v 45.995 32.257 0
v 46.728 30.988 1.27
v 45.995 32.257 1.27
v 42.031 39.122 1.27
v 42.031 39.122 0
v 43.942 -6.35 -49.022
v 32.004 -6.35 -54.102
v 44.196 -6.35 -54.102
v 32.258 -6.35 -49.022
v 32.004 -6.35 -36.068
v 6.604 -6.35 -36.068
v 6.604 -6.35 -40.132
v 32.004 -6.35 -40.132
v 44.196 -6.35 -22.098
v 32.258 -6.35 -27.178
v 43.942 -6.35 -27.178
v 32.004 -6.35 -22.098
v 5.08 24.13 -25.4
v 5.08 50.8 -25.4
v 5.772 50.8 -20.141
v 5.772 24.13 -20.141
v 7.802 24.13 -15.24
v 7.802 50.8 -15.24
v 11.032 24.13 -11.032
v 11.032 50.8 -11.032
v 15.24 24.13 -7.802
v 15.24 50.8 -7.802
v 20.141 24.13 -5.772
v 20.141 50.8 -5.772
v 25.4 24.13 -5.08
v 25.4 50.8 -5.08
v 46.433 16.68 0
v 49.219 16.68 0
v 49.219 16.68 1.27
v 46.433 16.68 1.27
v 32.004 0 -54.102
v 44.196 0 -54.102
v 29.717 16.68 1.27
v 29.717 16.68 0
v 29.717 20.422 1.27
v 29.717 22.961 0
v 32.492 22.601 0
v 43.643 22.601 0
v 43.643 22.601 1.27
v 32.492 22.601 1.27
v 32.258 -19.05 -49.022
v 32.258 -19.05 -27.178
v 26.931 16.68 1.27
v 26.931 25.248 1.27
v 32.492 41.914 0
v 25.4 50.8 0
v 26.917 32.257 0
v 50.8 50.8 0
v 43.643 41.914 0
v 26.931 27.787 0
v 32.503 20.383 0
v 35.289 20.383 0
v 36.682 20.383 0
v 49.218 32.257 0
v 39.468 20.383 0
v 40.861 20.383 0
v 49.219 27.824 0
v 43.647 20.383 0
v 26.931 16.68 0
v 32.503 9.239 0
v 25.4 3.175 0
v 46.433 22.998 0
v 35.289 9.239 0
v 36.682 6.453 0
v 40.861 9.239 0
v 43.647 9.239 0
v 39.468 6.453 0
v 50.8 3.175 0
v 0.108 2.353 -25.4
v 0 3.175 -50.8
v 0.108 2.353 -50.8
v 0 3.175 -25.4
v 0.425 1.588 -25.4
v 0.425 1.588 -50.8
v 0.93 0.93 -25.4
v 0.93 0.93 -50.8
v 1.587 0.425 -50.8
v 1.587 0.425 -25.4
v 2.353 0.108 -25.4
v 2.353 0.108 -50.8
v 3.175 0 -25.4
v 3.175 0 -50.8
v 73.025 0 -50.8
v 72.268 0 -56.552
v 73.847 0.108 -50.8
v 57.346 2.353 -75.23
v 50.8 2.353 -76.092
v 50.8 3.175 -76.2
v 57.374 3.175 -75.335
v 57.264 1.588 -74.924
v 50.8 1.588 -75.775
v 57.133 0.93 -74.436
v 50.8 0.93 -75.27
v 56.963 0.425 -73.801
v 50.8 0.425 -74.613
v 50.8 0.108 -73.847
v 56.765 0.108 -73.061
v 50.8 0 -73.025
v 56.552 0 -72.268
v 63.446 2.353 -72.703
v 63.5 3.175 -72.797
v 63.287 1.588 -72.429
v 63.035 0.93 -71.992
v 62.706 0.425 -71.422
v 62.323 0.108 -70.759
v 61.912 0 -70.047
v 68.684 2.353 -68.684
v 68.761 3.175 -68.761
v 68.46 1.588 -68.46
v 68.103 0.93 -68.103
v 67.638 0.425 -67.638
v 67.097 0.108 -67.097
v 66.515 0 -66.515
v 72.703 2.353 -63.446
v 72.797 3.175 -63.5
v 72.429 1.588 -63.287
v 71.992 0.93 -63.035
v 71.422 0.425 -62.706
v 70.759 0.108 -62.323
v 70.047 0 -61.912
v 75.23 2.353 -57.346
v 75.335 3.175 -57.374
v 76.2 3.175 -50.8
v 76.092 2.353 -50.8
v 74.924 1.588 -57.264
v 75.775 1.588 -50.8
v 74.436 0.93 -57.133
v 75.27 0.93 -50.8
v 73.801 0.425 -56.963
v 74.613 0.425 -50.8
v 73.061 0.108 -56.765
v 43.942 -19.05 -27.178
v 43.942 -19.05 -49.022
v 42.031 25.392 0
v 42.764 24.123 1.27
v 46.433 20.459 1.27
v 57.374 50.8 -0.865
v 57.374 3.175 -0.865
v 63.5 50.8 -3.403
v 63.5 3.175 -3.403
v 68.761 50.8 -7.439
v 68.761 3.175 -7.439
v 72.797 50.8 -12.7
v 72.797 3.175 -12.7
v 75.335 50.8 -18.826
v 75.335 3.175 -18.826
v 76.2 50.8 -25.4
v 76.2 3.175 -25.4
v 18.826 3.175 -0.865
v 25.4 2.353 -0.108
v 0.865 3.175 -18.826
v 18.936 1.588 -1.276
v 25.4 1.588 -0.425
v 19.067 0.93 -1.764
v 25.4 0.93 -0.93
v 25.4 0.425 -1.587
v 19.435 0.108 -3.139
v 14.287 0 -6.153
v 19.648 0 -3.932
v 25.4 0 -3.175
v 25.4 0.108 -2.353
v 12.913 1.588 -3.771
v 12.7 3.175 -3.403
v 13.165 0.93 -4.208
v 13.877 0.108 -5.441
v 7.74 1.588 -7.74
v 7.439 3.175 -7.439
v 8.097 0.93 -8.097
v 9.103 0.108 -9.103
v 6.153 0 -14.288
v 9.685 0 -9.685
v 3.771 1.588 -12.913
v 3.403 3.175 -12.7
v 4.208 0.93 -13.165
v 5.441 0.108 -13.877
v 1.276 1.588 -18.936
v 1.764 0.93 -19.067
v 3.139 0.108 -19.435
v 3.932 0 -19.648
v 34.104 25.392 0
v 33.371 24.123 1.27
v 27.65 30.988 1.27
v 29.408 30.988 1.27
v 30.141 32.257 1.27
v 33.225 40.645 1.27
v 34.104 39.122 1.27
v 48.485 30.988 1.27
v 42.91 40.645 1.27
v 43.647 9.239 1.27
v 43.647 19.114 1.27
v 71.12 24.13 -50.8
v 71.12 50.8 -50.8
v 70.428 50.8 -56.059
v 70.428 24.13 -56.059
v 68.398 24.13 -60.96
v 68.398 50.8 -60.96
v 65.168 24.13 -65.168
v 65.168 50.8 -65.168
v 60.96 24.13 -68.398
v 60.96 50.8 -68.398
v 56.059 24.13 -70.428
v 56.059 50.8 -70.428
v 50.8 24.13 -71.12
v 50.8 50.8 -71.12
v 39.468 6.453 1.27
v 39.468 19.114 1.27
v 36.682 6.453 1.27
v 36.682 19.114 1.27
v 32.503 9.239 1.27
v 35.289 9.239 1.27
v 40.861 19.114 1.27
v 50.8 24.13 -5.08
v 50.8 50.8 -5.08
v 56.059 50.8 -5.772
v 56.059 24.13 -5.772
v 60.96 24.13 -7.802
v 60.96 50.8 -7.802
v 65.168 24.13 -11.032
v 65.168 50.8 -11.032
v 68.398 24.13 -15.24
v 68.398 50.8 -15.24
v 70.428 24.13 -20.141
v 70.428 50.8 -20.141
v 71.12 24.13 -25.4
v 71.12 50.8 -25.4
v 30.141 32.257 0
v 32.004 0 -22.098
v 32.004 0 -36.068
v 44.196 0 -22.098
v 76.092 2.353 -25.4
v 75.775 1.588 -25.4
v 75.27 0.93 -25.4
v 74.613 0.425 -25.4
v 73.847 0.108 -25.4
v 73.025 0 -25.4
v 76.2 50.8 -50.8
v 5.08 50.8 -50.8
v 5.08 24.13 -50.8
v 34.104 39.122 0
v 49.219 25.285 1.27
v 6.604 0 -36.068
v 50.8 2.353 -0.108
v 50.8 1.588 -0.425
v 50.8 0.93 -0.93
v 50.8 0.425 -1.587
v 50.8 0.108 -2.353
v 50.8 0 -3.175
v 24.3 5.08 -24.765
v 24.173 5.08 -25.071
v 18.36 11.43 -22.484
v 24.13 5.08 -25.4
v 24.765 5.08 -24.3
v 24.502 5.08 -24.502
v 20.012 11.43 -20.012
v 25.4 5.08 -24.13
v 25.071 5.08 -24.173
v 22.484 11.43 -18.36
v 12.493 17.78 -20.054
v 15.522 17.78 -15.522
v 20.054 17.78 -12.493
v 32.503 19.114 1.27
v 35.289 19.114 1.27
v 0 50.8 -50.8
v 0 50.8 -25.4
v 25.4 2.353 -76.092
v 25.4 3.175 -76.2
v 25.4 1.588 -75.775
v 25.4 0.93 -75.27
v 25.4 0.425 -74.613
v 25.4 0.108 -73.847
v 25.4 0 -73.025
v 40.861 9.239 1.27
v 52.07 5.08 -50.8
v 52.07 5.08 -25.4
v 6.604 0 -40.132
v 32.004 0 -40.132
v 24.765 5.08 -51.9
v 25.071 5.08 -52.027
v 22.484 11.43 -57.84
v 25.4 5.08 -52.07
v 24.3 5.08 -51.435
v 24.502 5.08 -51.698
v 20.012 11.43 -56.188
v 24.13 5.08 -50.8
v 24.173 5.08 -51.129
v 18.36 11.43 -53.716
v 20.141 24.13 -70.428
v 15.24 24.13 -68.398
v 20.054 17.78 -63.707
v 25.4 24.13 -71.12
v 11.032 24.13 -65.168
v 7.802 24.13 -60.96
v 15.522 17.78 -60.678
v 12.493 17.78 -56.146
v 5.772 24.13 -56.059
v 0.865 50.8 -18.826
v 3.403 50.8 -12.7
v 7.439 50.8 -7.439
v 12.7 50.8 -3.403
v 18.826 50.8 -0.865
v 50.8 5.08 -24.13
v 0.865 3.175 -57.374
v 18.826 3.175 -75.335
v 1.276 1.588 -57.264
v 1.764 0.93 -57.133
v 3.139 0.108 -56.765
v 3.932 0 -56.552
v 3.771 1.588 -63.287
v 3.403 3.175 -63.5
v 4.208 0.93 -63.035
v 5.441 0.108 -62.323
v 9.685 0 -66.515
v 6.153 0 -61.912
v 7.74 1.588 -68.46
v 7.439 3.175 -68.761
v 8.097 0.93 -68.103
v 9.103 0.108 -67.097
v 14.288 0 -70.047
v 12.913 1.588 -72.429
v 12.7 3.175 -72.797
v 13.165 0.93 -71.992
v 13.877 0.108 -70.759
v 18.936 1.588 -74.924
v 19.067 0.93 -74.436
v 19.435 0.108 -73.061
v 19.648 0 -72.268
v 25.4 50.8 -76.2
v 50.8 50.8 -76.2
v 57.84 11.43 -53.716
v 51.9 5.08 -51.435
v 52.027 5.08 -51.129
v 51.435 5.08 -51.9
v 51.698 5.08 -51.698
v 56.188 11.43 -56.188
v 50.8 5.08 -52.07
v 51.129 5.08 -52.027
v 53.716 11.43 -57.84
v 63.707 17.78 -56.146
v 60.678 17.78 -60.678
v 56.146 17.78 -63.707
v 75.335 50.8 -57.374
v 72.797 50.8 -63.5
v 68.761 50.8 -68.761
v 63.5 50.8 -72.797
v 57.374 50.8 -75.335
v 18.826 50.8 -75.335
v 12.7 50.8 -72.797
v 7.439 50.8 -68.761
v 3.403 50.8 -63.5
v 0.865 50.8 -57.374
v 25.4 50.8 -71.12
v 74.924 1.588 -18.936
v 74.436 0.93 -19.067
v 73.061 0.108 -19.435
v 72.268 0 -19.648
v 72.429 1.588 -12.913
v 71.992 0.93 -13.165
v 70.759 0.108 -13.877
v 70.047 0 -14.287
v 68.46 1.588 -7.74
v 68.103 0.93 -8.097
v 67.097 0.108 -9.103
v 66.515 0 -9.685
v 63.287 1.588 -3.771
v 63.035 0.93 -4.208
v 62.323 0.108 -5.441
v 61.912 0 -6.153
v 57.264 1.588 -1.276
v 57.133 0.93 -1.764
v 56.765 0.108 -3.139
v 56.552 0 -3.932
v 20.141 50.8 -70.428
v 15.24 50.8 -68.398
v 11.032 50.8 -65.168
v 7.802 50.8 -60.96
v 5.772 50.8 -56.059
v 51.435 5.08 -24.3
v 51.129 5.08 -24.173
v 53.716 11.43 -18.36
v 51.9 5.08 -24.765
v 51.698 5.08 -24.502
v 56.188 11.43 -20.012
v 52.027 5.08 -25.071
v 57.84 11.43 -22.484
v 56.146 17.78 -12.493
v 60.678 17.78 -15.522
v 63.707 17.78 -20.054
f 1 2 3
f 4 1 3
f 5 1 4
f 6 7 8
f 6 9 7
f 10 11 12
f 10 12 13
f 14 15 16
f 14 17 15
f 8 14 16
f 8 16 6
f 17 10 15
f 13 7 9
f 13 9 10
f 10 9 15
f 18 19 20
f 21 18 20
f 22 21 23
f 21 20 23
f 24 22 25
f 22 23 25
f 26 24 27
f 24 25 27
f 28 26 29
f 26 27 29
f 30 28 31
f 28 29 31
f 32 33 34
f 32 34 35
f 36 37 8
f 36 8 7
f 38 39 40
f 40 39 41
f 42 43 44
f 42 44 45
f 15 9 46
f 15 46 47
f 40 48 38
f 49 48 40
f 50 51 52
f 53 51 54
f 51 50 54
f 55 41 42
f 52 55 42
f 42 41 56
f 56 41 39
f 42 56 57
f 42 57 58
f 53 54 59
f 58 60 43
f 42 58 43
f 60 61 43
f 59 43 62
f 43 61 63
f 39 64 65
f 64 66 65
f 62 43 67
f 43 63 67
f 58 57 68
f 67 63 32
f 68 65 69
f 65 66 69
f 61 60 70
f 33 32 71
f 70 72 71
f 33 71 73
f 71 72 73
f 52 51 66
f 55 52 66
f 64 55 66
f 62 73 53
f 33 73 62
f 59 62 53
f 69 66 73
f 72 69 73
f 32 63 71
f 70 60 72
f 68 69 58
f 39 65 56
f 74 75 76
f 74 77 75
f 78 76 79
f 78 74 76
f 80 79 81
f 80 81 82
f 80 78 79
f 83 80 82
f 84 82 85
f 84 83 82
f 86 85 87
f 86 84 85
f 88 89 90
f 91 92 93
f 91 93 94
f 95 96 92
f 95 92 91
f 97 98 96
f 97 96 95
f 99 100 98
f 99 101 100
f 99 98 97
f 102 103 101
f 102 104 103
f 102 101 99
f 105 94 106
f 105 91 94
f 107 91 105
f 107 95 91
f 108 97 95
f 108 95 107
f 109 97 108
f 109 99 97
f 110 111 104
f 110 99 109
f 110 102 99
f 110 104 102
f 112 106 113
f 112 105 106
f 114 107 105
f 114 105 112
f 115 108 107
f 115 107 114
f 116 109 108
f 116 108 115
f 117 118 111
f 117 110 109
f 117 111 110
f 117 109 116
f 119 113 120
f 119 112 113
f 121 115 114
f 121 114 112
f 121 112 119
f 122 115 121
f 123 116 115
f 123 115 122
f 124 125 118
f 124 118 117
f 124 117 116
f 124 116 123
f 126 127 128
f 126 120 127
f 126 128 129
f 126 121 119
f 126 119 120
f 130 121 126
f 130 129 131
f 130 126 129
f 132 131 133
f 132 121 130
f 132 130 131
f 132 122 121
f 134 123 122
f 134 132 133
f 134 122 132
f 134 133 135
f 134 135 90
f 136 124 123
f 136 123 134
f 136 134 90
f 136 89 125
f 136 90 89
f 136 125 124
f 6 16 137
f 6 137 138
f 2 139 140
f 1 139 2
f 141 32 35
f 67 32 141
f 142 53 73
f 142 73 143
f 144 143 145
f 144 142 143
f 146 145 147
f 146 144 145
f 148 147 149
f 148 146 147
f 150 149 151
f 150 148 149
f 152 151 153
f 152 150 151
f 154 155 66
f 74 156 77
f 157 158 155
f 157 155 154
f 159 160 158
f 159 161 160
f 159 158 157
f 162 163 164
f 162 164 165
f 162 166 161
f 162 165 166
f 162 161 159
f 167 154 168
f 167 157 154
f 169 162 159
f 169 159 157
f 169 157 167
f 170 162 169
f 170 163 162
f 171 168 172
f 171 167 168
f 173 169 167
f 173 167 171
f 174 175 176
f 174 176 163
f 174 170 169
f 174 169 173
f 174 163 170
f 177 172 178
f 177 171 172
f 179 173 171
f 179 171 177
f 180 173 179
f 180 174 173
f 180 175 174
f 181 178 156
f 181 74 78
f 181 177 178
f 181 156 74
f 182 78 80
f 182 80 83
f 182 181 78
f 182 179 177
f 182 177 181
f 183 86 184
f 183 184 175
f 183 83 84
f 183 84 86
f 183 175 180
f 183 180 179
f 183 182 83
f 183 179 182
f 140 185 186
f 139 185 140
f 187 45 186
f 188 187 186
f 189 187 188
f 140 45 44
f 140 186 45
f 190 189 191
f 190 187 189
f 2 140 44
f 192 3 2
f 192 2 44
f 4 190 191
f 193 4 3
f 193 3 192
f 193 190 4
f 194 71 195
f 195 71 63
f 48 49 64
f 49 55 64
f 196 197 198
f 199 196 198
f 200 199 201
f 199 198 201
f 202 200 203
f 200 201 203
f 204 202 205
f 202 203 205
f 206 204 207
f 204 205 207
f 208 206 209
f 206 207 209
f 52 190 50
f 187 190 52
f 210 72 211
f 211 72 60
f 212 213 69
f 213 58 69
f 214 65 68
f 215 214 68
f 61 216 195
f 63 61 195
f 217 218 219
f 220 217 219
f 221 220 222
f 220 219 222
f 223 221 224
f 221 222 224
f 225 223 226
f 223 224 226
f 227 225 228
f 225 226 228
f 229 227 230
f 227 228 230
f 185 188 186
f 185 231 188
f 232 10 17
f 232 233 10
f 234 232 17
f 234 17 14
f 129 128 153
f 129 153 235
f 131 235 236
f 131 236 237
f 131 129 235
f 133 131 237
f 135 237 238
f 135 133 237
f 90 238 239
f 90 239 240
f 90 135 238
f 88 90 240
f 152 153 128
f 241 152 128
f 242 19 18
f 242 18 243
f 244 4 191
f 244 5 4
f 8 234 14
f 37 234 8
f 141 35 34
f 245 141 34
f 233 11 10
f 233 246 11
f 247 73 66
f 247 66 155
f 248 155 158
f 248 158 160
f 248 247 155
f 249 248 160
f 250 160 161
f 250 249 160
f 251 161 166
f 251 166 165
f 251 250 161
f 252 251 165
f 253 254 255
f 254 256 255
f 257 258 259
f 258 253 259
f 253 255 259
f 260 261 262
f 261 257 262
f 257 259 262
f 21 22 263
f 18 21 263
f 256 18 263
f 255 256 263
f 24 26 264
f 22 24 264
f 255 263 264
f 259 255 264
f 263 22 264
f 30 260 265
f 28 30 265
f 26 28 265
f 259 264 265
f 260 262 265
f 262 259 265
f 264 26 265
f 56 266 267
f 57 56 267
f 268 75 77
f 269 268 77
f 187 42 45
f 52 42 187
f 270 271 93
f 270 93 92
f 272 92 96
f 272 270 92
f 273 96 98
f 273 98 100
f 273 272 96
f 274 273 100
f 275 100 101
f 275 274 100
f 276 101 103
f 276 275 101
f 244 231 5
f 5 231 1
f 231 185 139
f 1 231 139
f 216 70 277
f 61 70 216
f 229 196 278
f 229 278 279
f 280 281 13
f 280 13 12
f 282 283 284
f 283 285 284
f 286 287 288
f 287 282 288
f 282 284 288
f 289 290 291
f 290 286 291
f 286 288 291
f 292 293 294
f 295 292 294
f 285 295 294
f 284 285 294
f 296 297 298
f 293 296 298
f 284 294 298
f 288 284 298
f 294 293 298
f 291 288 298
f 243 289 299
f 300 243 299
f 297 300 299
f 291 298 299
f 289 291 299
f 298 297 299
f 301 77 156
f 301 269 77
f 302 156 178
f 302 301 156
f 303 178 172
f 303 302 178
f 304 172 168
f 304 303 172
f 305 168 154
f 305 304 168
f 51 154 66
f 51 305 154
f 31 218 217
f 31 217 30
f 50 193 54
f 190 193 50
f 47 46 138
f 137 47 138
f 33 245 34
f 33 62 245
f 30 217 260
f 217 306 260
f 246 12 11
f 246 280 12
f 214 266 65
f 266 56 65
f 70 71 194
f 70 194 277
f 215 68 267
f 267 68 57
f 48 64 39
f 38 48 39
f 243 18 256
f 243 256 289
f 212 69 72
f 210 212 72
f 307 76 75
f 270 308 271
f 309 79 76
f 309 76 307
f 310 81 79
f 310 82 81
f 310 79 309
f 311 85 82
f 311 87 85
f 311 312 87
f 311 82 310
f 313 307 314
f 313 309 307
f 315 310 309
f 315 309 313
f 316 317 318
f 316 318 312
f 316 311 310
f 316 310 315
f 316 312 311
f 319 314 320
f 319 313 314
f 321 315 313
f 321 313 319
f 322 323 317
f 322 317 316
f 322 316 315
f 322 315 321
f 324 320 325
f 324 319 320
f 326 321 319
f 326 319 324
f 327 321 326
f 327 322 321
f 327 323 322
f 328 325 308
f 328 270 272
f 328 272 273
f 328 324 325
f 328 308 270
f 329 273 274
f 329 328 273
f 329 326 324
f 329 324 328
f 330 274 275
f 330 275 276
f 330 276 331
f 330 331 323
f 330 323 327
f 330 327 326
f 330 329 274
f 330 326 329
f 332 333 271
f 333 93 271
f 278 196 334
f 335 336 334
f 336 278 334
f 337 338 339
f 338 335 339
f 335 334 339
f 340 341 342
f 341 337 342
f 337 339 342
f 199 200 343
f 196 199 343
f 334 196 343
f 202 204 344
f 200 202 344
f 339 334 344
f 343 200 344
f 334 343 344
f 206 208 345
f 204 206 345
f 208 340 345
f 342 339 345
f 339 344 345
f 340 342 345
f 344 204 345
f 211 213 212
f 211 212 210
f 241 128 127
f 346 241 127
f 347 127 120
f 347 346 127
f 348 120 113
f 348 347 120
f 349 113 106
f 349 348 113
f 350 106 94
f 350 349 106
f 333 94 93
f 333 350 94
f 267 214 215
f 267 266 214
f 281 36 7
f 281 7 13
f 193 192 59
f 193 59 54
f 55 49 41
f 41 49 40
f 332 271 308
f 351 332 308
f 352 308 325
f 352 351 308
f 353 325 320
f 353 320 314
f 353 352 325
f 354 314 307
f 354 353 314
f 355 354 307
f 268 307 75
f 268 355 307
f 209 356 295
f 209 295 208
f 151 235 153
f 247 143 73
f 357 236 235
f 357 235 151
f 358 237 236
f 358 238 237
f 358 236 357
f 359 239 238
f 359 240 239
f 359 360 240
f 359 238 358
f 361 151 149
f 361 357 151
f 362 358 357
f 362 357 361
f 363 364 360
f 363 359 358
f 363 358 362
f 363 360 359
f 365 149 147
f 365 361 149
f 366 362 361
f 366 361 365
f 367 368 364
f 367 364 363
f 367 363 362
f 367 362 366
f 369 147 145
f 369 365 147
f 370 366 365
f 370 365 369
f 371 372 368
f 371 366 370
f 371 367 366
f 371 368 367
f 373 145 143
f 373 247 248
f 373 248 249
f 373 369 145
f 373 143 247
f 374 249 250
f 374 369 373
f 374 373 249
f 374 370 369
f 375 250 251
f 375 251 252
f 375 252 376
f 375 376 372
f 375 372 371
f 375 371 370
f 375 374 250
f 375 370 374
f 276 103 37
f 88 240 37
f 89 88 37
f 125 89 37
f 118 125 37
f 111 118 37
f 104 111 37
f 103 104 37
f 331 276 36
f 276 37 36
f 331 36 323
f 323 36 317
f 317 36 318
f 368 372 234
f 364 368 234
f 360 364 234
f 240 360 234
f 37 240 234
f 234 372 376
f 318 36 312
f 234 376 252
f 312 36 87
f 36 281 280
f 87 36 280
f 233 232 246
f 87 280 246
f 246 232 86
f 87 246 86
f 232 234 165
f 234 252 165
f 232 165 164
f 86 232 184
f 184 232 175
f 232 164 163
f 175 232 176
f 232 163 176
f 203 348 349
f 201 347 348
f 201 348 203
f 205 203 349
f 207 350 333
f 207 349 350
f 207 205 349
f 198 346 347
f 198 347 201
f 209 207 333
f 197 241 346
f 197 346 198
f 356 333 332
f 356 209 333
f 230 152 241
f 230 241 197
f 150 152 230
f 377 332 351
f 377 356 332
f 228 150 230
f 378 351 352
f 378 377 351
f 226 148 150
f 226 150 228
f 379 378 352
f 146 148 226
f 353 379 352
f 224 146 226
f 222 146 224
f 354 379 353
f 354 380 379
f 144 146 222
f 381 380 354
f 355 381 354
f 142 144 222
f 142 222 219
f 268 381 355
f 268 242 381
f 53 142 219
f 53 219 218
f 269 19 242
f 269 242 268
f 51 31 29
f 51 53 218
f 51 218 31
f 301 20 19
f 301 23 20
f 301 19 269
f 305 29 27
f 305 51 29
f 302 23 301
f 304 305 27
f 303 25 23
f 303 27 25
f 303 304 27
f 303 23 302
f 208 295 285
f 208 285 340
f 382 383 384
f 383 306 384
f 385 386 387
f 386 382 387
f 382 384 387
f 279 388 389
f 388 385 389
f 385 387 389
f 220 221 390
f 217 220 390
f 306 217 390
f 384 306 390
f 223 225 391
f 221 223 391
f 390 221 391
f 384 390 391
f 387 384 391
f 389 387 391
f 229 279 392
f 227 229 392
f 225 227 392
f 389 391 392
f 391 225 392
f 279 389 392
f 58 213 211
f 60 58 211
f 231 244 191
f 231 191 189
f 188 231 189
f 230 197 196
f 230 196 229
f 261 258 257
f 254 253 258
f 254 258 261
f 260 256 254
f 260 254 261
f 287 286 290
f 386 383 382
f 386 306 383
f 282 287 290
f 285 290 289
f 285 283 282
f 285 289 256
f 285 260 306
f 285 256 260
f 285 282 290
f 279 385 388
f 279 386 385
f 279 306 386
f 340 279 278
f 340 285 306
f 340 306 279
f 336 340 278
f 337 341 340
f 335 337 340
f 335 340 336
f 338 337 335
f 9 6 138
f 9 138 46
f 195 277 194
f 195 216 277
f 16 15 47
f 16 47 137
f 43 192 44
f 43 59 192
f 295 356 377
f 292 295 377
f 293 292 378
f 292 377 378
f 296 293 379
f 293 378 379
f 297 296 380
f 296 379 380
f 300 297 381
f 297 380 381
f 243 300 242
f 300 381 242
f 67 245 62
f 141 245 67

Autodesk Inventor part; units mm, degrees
ref_plane "YZ Plane" through (0, 0, 0) normal (1, 0, 0) x (0, 1, 0)
ref_plane "XZ Plane" through (0, 0, 0) normal (0, 1, 0) x (-1, 0, 0)
ref_plane "XY Plane" through (0, 0, 0) normal (0, 0, 1) x (1, 0, 0)
sketch "Sketch1" plane through (0, 0, 0) normal (0, 1, 0) x (-1, 0, 0)
  line L0 (0, 0) -> (-76.2, 0)
  line L1 (-76.2, 0) -> (-76.2, -76.2)
  line L2 (-76.2, -76.2) -> (0, -76.2)
  line L3 (0, -76.2) -> (0, 0)
  dimension "d0" = 76.2
  dimension "d1" = 76.2
extrude "Extrusion1" add sketch "Sketch1" along normal blind 50.8
sketch "Sketch3" plane through (0, 0, 0) normal (0, -1, 0) x (1, 0, 0)
  line L0 (44.196, -54.102) -> (32.004, -54.102)
  line L1 (32.004, -54.102) -> (32.004, -22.098)
  line L2 (32.004, -22.098) -> (44.196, -22.098)
  line L3 (44.196, -22.098) -> (44.196, -54.102)
  line L4 (76.2, 0) -> (76.2, -76.2) projected
  line L5 (0, 0) -> (76.2, 0) projected
  line L6 (32.004, -40.132) -> (6.604, -40.132)
  line L7 (6.604, -40.132) -> (6.604, -36.068)
  line L8 (6.604, -36.068) -> (32.004, -36.068)
  line L9 (32.004, -36.068) -> (32.004, -40.132)
  point P0 (44.196, -38.1)
  point P1 (76.2, -38.1)
  point P2 (38.1, -22.098)
  point P3 (38.1, 0)
  point P4 (6.604, -38.1)
  point P5 (32.004, -38.1)
  dimension "d10" = 32.004
  dimension "d11" = 12.192
  dimension "d12" = 25.4
  dimension "d13" = 4.064
extrude "Extrusion3" add sketch "Sketch3" along normal blind 6.35
sketch "Sketch4" plane through (0, -6.35, 0) normal (0, -1, 0) x (1, 0, 0)
  line L0 (43.942, -49.022) -> (32.258, -49.022)
  line L1 (32.258, -49.022) -> (32.258, -27.178)
  line L2 (32.258, -27.178) -> (43.942, -27.178)
  line L3 (43.942, -27.178) -> (43.942, -49.022)
  line L4 (44.196, -54.102) -> (44.196, -22.098) projected
  line L5 (32.004, -54.102) -> (44.196, -54.102) projected
  point P0 (0, 0)
  point P1 (32.258, -38.1)
  point P2 (44.196, -38.1)
  point P3 (38.1, -49.022)
  point P4 (38.1, -54.102)
  dimension "d16" = 21.844
  dimension "d17" = 11.684
extrude "Extrusion4" add sketch "Sketch4" along normal blind 12.7
fillet "Fillet1" radius 25.4 4 edges at (0, 25.4, -76.2) (0, 25.4, 0) (76.2, 25.4, -76.2) (76.2, 25.4, 0)
sketch "Sketch5" plane through (0, 50.8, 0) normal (0, 1, 0) x (1, 0, 0)
  arc A0 (50.8, 0) -> (76.2, 25.4) centre (50.8, 25.4) ccw projected
  line L0 (76.2, 25.4) -> (76.2, 50.8) projected
  arc A1 (76.2, 50.8) -> (50.8, 76.2) centre (50.8, 50.8) ccw projected
  line L1 (50.8, 76.2) -> (25.4, 76.2) projected
  arc A2 (25.4, 76.2) -> (0, 50.8) centre (25.4, 50.8) ccw projected
  line L2 (0, 50.8) -> (0, 25.4) projected
  arc A3 (0, 25.4) -> (25.4, 0) centre (25.4, 25.4) ccw projected
  line L3 (25.4, 0) -> (50.8, 0) projected
  arc A4 (25.4, 71.12) -> (5.08, 50.8) centre (25.4, 50.8) ccw
  line L4 (25.4, 71.12) -> (50.8, 71.12)
  arc A5 (71.12, 50.8) -> (50.8, 71.12) centre (50.8, 50.8) ccw
  line L5 (71.12, 50.8) -> (71.12, 25.4)
  arc A6 (50.8, 5.08) -> (71.12, 25.4) centre (50.8, 25.4) ccw
  line L6 (50.8, 5.08) -> (25.4, 5.08)
  arc A7 (5.08, 25.4) -> (25.4, 5.08) centre (25.4, 25.4) ccw
  line L7 (5.08, 25.4) -> (5.08, 50.8)
  point P0 (0, 0)
  point P1 (38.1, 76.2)
  dimension "d21" = 5.08
extrude "Extrusion5" cut sketch "Sketch5" against normal blind 45.72 contours L4 A5 L5 A6 L6 A7 L7 A4
fillet "Fillet2" radius 3.175 8 edges at (0, 0, -38.1) (7.4395, 0, -7.4395) (38.1, 0, 0) (68.7605, 0, -7.4395) (76.2, 0, -38.1) (68.7605, 0, -68.7605) (38.1, 0, -76.2) (7.4395, 0, -68.7605)
chamfer "Chamfer1" distance 19.05 angle 45 8 edges at (38.1, 5.08, -5.08) (11.0316, 5.08, -11.0316) (5.08, 5.08, -38.1) (11.0316, 5.08, -65.1684) (38.1, 5.08, -71.12) (65.1684, 5.08, -65.1684) (71.12, 5.08, -38.1) (65.1684, 5.08, -11.0316)
sketch "Sketch6" plane through (0, 50.8, -50.8) normal (-1, 0, 0) x (0, 0, 1)
  line L0 (7.2288, -10.0054) -> (18.3794, -10.0054)
  line L1 (18.3794, -10.0054) -> (23.9547, -19.6621)
  line L2 (23.9547, -19.6621) -> (18.3794, -29.3188)
  line L3 (18.3794, -29.3188) -> (7.2288, -29.3188)
  line L4 (7.2288, -29.3188) -> (1.6535, -19.6621)
  line L5 (1.6535, -19.6621) -> (7.2288, -10.0054)
  line L6 (16.7677, -26.5271) -> (20.7312, -19.6621)
  line L7 (20.7312, -19.6621) -> (16.7677, -12.797)
  line L8 (16.7677, -12.797) -> (8.8406, -12.797)
  line L9 (8.8406, -12.797) -> (4.877, -19.6621)
  line L10 (4.877, -19.6621) -> (8.8406, -26.5271)
  line L11 (8.8406, -26.5271) -> (16.7677, -26.5271)
  line L12 (23.9558, -24.0955) -> (23.9558, -35.2397)
  line L13 (23.9558, -35.2397) -> (21.1698, -35.2397)
  line L14 (21.1698, -35.2397) -> (21.1698, -28.9211)
  line L15 (21.1698, -28.9211) -> (23.9558, -24.0955)
  line L16 (18.3837, -42.6806) -> (15.5977, -42.6806)
  line L17 (15.5977, -42.6806) -> (15.5977, -31.5364)
  line L18 (7.2396, -31.5364) -> (7.2396, -42.6806)
  line L19 (7.2396, -42.6806) -> (10.0256, -42.6806)
  line L20 (10.0256, -42.6806) -> (10.0256, -31.5364)
  line L21 (1.6675, -24.1328) -> (1.6675, -35.2397)
  line L22 (1.6675, -35.2397) -> (4.4535, -35.2397)
  line L23 (4.4535, -35.2397) -> (4.4535, -28.9583)
  line L24 (4.4535, -28.9583) -> (1.6675, -24.1328)
  line L25 (14.2047, -45.4666) -> (14.2047, -31.5364)
  line L26 (14.2047, -31.5364) -> (11.4186, -31.5364)
  line L27 (11.4186, -31.5364) -> (11.4186, -45.4666)
  line L28 (11.4186, -45.4666) -> (14.2047, -45.4666)
  line L29 (10.0256, -31.5364) -> (7.2396, -31.5364)
  line L30 (15.5977, -42.6806) -> (14.2047, -42.6806) construction
  line L31 (10.0256, -42.6806) -> (11.4186, -42.6806) construction
  line L32 (18.3837, -42.6806) -> (18.3837, -31.5364)
  line L33 (18.3837, -31.5364) -> (15.5977, -31.5364)
  line L34 (12.8041, -44.5678) -> (12.8041, -1.5402) construction
  line L35 (36.5346, -1.5402) -> (-10.9264, -1.5402)
  point P0 (50.8, -50.8)
  point P1 (12.8041, -19.6621)
  dimension "d28" = 11.1506
  dimension "d29" = 2.7916
  dimension "d30" = 2.2177
  dimension "d31" = 2.2232
  dimension "d32" = 2.786
  dimension "d33" = 2.786
  dimension "d34" = 2.786
  dimension "d35" = 2.786
  dimension "d36" = 2.2177
  dimension "d37" = 11.1441
  dimension "d38" = 11.1441
  dimension "d39" = 13.9302
  dimension "d40" = 2.786
  dimension "d41" = 2.786
  dimension "d42" = 2.786
  dimension "d43" = 1.393
  dimension "d44" = 2.7903
sketch "Sketch7" plane through (25.4, 50.8, 0) normal (0, 0, 1) x (1, 0, 0)
  line L0 (4.3171, -27.8388) -> (1.5311, -23.0133)
  line L1 (1.5311, -23.0133) -> (1.5311, -34.1202)
  line L2 (4.7406, -18.5426) -> (8.7041, -25.4077)
  line L3 (7.0924, -28.1993) -> (1.5171, -18.5426)
  line L4 (12.6677, -47.791) -> (12.6677, -4.9445) construction
  line L5 (8.7041, -11.6775) -> (4.7406, -18.5426)
  line L6 (1.5171, -18.5426) -> (7.0924, -8.8859)
  line L7 (1.5311, -34.1202) -> (4.3171, -34.1202)
  line L8 (4.3171, -34.1202) -> (4.3171, -27.8388)
  line L9 (16.6312, -25.4077) -> (20.5948, -18.5426)
  line L10 (23.8183, -18.5426) -> (18.243, -28.1993)
  line L11 (18.243, -28.1993) -> (7.0924, -28.1993)
  line L12 (7.0924, -8.8859) -> (18.243, -8.8859)
  line L13 (18.243, -8.8859) -> (23.8183, -18.5426)
  line L14 (84.753, -4.9445) -> (-59.4176, -4.9445)
  line L15 (16.6312, -11.6775) -> (8.7041, -11.6775)
  line L16 (8.7041, -25.4077) -> (16.6312, -25.4077)
  line L17 (20.5948, -18.5426) -> (16.6312, -11.6775)
  line L18 (21.0333, -34.1202) -> (21.0333, -27.8016)
  line L19 (21.0333, -27.8016) -> (23.8194, -22.976)
  line L20 (23.8194, -34.1202) -> (21.0333, -34.1202)
  line L21 (23.8194, -22.976) -> (23.8194, -34.1202)
  line L22 (18.2473, -41.5611) -> (15.4613, -41.5611)
  line L23 (15.4613, -41.5611) -> (15.4613, -30.4169)
  line L24 (14.0682, -30.4169) -> (11.2822, -30.4169)
  line L25 (18.2473, -30.4169) -> (15.4613, -30.4169)
  line L26 (9.8892, -30.4169) -> (7.1032, -30.4169)
  line L27 (7.1032, -30.4169) -> (7.1032, -41.5611)
  line L28 (7.1032, -41.5611) -> (9.8892, -41.5611)
  line L29 (18.2473, -41.5611) -> (18.2473, -30.4169)
  line L30 (15.4613, -41.5611) -> (14.0682, -41.5611) construction
  line L31 (9.8892, -41.5611) -> (9.8892, -30.4169)
  line L32 (9.8892, -41.5611) -> (11.2822, -41.5611) construction
  line L33 (14.0682, -44.3471) -> (14.0682, -30.4169)
  line L34 (11.2822, -30.4169) -> (11.2822, -44.3471)
  line L35 (11.2822, -44.3471) -> (14.0682, -44.3471)
  point P0 (-25.4, -50.8)
  point P1 (2.3088, -54.2043)
  point P2 (12.6677, -18.5426)
  dimension "d45" = 11.1506
  dimension "d46" = 2.7916
  dimension "d47" = 2.2177
  dimension "d48" = 2.2232
  dimension "d49" = 2.786
  dimension "d50" = 2.786
  dimension "d51" = 2.786
  dimension "d52" = 2.786
  dimension "d53" = 2.2177
  dimension "d54" = 11.1441
  dimension "d55" = 11.1441
  dimension "d56" = 13.9302
  dimension "d57" = 2.786
  dimension "d58" = 2.786
  dimension "d59" = 2.786
  dimension "d60" = 1.393
  dimension "d61" = 2.7903
extrude "Extrusion6" add sketch "Sketch7" along normal blind 1.27
chamfer "Chamfer2" distance 1.27 angle 45 11 edges at (47.8264, 25.4112, 1.27) (42.2543, 20.3831, 1.27) (38.0752, 20.3831, 1.27) (33.8962, 20.3831, 1.27) (28.3241, 25.3739, 1.27) (32.1224, 28.8249, 1.27) (38.0677, 25.3923, 1.27) (44.013, 28.8249, 1.27) (46.4306, 37.0858, 1.27) (38.0677, 41.9141, 1.27) (29.7047, 37.0858, 1.27)
properties part number "Hand Base"
